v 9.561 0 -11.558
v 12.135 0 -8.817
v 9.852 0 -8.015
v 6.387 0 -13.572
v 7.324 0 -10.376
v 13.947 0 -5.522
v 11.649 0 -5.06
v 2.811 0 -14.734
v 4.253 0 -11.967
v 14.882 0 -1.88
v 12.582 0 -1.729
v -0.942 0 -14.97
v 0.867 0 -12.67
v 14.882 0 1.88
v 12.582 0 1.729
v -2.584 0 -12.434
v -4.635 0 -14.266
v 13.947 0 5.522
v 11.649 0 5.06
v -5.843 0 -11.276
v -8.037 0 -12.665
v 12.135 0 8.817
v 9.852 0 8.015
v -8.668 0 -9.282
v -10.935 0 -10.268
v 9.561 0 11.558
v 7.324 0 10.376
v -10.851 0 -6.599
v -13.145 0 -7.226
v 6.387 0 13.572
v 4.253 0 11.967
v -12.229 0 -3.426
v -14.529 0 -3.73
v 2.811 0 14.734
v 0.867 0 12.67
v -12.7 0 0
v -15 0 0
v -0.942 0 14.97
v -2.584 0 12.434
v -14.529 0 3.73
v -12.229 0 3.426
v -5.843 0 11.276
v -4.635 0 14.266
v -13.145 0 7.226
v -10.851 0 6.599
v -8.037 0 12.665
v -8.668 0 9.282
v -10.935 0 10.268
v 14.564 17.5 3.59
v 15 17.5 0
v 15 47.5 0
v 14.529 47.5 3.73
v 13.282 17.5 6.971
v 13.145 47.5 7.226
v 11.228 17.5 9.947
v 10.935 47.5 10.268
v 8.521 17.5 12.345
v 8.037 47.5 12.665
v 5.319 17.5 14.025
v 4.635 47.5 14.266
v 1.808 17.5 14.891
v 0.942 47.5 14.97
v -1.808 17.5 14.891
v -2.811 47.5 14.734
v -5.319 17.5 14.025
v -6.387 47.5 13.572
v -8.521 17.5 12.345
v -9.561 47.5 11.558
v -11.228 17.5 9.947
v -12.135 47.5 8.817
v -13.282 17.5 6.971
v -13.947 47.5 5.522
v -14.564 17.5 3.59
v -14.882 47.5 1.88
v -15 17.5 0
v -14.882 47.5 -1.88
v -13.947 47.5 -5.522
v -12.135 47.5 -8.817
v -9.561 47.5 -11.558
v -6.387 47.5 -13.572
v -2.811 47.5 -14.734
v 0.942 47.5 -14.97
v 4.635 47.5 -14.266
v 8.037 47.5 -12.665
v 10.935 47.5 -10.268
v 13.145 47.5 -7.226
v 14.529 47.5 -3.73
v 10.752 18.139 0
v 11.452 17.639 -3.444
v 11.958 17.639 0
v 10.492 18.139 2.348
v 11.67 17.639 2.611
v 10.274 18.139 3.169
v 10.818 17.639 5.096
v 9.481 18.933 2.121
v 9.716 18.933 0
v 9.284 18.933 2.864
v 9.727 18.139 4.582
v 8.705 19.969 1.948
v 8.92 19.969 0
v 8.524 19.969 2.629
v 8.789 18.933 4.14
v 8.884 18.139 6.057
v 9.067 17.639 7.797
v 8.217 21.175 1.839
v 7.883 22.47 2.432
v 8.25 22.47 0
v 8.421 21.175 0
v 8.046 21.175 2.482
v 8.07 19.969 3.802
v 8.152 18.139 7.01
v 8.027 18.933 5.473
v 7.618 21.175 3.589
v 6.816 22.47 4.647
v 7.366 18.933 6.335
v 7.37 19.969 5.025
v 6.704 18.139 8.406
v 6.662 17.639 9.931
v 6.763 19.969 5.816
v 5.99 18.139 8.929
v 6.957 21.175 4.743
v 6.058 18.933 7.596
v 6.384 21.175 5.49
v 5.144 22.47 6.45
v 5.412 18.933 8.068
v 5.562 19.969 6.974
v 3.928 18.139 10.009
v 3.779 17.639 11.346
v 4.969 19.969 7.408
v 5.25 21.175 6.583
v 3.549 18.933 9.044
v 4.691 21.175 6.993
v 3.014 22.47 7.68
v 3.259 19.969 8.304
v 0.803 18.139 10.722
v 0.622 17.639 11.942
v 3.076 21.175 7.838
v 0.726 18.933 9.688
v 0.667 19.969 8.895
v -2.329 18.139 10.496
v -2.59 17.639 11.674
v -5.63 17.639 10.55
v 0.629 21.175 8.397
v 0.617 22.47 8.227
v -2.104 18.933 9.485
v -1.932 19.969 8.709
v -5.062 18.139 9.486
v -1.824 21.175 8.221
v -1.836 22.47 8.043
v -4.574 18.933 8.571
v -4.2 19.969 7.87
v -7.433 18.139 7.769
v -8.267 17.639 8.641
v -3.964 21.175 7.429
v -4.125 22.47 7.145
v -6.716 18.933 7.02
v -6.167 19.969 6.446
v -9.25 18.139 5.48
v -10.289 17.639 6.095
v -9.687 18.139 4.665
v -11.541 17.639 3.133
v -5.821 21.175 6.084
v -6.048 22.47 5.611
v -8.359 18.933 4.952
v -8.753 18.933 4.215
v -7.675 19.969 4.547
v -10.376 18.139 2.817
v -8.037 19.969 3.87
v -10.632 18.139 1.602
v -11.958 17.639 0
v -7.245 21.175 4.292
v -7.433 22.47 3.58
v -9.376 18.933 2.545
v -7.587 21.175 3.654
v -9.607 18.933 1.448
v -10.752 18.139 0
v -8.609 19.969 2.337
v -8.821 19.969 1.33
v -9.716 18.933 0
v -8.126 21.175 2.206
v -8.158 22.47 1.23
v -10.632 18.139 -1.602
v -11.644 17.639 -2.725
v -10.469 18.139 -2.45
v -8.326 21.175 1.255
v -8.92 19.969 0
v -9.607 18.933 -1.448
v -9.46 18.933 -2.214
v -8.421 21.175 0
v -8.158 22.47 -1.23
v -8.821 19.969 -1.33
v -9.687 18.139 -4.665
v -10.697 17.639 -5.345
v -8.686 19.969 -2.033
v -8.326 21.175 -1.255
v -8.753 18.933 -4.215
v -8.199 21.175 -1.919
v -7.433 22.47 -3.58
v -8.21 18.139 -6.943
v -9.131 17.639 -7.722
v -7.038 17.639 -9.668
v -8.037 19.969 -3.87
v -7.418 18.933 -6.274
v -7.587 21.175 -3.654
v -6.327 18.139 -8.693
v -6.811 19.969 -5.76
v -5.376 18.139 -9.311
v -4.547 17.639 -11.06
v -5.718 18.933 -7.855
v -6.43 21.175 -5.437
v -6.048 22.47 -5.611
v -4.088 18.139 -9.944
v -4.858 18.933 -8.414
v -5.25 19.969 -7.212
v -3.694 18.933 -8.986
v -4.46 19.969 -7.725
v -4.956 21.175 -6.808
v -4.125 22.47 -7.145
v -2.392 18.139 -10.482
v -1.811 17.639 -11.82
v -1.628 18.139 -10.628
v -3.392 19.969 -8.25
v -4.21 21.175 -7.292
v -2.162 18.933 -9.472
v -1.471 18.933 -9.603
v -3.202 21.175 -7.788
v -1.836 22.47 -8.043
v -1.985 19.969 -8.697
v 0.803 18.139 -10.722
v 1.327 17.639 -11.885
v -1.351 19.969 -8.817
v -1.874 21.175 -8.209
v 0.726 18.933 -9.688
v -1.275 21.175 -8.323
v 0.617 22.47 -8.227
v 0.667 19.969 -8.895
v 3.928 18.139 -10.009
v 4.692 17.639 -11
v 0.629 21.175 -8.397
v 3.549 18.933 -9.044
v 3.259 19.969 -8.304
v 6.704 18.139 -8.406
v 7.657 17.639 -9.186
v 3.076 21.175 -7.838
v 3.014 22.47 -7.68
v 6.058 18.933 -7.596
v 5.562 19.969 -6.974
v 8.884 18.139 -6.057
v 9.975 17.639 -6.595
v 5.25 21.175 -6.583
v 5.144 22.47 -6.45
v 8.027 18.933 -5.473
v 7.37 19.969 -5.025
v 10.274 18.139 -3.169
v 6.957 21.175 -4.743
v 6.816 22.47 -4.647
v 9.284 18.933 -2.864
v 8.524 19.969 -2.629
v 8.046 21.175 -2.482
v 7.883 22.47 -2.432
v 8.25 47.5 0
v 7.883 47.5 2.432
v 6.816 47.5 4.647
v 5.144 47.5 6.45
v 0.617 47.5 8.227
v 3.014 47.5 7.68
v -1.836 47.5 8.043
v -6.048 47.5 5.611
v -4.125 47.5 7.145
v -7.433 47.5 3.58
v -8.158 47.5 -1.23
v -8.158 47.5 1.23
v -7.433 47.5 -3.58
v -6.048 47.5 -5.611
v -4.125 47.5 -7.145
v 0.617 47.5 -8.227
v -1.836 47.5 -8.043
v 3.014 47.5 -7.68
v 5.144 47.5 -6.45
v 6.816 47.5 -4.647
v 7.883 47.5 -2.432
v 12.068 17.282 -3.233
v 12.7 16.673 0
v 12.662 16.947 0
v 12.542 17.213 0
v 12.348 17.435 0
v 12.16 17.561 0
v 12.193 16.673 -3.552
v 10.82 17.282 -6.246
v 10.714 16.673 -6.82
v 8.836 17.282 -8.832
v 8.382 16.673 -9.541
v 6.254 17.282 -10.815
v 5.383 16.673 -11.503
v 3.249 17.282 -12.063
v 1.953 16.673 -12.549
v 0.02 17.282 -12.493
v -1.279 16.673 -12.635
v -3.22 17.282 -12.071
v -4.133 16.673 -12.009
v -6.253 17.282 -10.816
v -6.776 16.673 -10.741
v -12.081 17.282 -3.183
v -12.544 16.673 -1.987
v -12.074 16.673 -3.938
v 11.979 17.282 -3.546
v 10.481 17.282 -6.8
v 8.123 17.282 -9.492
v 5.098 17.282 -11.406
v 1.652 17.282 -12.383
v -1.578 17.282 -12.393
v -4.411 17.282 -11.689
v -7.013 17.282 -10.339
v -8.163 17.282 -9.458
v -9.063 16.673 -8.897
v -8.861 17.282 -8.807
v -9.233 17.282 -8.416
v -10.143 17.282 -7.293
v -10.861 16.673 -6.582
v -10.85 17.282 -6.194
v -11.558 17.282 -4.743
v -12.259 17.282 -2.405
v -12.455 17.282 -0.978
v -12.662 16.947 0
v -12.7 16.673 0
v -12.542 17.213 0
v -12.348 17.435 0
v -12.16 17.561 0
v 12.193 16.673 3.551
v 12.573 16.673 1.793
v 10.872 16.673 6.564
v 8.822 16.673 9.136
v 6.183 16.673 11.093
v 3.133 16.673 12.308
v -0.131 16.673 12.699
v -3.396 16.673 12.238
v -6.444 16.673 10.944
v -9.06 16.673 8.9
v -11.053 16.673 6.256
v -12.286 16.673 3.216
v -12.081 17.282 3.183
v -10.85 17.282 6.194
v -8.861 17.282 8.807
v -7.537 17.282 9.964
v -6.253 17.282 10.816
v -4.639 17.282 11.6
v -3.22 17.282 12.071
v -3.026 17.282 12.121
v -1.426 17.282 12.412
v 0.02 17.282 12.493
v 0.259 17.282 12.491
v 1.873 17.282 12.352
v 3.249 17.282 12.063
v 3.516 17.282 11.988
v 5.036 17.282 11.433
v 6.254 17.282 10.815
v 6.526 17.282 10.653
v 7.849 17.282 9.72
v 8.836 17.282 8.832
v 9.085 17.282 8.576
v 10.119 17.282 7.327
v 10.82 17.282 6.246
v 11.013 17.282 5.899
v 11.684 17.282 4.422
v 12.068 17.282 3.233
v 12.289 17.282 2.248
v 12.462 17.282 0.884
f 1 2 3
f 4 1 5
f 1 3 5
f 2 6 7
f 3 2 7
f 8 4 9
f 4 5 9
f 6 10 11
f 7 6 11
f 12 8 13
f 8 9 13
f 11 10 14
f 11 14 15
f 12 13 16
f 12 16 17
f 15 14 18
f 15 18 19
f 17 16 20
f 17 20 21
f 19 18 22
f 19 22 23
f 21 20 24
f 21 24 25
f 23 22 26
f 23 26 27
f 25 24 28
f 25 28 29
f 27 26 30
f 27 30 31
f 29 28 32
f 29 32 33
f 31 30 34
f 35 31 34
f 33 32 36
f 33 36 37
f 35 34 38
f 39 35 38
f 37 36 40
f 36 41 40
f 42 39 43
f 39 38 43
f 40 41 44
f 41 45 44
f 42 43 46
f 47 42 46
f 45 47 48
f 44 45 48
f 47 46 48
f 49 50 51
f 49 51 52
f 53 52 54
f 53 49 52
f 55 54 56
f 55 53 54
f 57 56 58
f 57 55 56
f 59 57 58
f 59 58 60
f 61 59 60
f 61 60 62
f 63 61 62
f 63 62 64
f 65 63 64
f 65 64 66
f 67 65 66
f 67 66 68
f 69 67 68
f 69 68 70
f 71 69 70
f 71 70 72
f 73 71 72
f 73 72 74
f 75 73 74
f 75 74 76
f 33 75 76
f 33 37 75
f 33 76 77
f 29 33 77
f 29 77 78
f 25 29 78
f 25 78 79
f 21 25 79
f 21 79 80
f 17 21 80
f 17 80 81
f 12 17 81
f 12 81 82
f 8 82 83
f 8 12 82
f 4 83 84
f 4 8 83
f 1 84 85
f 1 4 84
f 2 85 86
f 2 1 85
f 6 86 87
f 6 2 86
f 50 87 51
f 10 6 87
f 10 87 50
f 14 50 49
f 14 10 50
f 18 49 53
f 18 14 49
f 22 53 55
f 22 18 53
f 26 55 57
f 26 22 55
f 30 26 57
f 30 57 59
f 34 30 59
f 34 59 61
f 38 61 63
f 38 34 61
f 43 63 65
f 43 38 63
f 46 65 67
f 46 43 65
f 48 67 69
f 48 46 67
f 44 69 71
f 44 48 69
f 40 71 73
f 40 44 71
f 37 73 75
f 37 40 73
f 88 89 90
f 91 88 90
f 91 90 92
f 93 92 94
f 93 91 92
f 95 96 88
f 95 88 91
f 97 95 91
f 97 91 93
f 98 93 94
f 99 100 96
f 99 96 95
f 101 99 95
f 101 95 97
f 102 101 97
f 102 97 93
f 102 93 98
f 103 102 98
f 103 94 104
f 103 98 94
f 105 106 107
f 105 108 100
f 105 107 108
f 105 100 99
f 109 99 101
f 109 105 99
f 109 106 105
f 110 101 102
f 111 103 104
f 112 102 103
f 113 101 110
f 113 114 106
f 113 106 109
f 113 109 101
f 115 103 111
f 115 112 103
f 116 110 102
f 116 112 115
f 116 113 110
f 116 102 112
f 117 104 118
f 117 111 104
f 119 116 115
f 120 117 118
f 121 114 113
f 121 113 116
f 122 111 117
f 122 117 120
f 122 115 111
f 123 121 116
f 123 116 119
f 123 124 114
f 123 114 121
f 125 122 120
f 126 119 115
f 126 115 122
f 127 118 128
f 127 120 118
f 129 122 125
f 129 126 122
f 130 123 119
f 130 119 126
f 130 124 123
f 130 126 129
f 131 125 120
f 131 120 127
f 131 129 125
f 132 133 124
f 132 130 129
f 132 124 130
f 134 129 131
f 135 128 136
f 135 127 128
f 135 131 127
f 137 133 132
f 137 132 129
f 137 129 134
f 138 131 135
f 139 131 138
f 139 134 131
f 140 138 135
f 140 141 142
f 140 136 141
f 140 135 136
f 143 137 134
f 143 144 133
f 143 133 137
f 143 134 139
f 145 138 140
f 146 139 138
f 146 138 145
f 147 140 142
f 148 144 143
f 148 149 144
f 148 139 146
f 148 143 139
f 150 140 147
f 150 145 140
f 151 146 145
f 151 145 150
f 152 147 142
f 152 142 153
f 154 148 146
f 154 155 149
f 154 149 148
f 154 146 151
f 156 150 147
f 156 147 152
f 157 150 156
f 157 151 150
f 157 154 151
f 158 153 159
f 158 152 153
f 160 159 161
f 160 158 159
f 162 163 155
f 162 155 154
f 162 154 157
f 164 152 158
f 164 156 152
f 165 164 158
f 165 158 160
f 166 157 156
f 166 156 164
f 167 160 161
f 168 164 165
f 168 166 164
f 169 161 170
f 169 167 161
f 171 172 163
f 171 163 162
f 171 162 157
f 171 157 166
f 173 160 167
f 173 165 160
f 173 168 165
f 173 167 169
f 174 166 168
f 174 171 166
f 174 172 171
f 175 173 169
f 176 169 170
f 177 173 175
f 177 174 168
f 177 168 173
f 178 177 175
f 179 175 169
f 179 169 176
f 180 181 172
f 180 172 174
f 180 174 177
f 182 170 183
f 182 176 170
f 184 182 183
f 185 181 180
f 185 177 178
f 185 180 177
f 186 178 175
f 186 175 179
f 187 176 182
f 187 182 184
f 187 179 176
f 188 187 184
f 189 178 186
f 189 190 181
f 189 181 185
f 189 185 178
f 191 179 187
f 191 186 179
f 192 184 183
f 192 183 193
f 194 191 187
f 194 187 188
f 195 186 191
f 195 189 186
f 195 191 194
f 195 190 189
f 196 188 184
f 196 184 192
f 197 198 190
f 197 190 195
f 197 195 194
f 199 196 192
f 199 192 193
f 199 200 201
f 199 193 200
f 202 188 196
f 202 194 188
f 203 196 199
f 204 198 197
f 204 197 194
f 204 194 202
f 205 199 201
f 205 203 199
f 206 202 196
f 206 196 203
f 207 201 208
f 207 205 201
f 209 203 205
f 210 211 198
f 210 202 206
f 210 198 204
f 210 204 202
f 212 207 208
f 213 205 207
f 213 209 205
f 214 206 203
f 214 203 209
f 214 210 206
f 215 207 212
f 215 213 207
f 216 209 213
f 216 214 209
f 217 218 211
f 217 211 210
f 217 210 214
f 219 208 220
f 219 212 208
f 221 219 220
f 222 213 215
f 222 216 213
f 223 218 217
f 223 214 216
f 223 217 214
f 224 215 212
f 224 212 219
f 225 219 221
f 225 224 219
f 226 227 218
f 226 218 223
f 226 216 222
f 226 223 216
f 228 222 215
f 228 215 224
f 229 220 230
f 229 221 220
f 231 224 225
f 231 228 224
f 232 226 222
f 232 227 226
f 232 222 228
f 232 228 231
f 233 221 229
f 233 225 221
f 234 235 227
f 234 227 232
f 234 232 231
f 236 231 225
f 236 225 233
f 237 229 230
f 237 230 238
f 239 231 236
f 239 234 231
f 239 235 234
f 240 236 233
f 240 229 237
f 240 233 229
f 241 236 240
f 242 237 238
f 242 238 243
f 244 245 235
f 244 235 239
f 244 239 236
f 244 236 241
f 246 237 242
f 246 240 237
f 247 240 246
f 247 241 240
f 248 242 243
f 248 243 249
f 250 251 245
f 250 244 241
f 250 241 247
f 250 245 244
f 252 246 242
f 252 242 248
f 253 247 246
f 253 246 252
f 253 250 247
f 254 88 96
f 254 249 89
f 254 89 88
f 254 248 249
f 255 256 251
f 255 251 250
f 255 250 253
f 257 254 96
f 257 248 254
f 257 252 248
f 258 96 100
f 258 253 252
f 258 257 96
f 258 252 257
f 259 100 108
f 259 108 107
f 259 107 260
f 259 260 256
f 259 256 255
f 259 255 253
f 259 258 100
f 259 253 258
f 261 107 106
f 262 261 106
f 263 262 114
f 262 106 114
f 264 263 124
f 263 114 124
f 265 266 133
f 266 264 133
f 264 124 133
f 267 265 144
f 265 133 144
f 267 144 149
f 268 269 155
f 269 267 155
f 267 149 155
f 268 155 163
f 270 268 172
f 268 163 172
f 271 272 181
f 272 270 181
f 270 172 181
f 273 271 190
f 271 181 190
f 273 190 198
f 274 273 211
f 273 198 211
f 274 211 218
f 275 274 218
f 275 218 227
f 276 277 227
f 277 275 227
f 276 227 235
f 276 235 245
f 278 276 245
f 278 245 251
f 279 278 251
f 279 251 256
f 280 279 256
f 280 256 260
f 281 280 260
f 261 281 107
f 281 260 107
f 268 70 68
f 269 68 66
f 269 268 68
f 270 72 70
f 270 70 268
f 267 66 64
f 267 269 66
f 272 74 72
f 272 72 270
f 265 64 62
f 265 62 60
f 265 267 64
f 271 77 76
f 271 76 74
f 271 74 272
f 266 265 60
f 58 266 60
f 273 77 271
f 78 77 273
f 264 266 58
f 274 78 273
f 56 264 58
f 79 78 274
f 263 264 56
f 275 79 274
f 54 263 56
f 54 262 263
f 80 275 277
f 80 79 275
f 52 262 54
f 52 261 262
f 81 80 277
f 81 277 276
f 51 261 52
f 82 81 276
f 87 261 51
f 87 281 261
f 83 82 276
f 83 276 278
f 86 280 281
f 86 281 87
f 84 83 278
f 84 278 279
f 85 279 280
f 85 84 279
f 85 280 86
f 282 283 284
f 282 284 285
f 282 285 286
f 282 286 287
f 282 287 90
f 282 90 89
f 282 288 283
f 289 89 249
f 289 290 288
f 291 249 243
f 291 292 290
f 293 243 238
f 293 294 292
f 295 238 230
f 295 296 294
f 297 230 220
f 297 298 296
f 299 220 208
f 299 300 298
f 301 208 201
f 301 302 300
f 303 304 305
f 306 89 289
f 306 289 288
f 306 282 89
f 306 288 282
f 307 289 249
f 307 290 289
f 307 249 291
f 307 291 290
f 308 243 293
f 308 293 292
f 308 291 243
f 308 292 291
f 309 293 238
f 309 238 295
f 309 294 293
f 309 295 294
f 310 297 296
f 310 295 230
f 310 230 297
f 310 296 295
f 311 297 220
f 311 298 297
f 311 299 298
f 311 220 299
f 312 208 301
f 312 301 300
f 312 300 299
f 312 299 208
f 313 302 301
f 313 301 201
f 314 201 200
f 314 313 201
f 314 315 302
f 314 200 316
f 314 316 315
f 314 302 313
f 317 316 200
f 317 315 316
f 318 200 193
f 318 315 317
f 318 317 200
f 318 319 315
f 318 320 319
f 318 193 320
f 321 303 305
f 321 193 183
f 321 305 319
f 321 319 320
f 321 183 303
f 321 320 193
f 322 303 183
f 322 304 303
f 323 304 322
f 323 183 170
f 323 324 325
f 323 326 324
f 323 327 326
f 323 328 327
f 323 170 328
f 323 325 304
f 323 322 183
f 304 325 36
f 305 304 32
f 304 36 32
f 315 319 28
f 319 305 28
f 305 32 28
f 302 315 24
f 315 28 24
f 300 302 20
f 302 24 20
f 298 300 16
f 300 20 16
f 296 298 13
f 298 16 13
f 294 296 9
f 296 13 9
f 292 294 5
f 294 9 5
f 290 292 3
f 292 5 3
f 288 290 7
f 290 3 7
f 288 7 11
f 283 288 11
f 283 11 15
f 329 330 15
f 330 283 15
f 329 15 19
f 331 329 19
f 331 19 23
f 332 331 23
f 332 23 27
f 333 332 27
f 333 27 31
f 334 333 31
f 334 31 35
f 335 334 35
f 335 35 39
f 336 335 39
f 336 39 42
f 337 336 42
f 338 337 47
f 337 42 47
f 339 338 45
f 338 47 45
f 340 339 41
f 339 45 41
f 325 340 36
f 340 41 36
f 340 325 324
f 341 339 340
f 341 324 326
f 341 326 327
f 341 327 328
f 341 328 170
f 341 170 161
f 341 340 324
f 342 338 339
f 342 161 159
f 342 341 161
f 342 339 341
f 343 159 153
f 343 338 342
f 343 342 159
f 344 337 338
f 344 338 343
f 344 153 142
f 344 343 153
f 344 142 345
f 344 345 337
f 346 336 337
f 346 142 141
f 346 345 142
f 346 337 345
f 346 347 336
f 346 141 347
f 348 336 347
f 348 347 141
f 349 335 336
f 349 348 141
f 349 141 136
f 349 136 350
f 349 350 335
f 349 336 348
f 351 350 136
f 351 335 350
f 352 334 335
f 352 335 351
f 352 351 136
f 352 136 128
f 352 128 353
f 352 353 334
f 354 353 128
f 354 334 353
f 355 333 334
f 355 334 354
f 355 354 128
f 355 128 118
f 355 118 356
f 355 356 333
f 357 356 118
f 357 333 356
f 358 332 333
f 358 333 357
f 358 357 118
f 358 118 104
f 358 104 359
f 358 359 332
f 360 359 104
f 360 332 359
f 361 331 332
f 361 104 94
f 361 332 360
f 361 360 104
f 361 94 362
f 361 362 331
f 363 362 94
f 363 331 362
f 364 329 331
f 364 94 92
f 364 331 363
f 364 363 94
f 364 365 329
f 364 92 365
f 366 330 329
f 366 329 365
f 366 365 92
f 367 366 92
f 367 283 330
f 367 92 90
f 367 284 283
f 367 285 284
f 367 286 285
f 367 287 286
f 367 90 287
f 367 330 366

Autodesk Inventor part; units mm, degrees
ref_plane "YZ Plane" through (0, 0, 0) normal (1, 0, 0) x (0, 1, 0)
ref_plane "XZ Plane" through (0, 0, 0) normal (0, 1, 0) x (-1, 0, 0)
ref_plane "XY Plane" through (0, 0, 0) normal (0, 0, 1) x (1, 0, 0)
sketch "Эскиз1" plane through (0, 0, 0) normal (0, 1, 0) x (-1, 0, 0)
  circle A0 centre (0, 0) radius 12.7
  circle A1 centre (0, 0) radius 15
  dimension "d0" = 25.4
  dimension "d1" = 30
extrude "Выдавливание1" add sketch "Эскиз1" along normal blind 17.5
sketch "Эскиз3" plane through (0, 17.5, 0) normal (0, 1, 0) x (1, 0, 0)
  circle A0 centre (0, 0) radius 15
  circle A1 centre (0, 0) radius 8.25
  circle A2 centre (0, 0) radius 15 projected
  dimension "d4" = 16.5
  dimension "d9" = 0
extrude "Выдавливание2" add sketch "Эскиз3" along normal blind 30
fillet "Сопряжение1" radius 5 1 edges at (-8.25, 17.5, 0)
fillet "Сопряжение2" radius 1 2 edges at (0, 17.5, -12.7) (0, 17.5, 12.7)
